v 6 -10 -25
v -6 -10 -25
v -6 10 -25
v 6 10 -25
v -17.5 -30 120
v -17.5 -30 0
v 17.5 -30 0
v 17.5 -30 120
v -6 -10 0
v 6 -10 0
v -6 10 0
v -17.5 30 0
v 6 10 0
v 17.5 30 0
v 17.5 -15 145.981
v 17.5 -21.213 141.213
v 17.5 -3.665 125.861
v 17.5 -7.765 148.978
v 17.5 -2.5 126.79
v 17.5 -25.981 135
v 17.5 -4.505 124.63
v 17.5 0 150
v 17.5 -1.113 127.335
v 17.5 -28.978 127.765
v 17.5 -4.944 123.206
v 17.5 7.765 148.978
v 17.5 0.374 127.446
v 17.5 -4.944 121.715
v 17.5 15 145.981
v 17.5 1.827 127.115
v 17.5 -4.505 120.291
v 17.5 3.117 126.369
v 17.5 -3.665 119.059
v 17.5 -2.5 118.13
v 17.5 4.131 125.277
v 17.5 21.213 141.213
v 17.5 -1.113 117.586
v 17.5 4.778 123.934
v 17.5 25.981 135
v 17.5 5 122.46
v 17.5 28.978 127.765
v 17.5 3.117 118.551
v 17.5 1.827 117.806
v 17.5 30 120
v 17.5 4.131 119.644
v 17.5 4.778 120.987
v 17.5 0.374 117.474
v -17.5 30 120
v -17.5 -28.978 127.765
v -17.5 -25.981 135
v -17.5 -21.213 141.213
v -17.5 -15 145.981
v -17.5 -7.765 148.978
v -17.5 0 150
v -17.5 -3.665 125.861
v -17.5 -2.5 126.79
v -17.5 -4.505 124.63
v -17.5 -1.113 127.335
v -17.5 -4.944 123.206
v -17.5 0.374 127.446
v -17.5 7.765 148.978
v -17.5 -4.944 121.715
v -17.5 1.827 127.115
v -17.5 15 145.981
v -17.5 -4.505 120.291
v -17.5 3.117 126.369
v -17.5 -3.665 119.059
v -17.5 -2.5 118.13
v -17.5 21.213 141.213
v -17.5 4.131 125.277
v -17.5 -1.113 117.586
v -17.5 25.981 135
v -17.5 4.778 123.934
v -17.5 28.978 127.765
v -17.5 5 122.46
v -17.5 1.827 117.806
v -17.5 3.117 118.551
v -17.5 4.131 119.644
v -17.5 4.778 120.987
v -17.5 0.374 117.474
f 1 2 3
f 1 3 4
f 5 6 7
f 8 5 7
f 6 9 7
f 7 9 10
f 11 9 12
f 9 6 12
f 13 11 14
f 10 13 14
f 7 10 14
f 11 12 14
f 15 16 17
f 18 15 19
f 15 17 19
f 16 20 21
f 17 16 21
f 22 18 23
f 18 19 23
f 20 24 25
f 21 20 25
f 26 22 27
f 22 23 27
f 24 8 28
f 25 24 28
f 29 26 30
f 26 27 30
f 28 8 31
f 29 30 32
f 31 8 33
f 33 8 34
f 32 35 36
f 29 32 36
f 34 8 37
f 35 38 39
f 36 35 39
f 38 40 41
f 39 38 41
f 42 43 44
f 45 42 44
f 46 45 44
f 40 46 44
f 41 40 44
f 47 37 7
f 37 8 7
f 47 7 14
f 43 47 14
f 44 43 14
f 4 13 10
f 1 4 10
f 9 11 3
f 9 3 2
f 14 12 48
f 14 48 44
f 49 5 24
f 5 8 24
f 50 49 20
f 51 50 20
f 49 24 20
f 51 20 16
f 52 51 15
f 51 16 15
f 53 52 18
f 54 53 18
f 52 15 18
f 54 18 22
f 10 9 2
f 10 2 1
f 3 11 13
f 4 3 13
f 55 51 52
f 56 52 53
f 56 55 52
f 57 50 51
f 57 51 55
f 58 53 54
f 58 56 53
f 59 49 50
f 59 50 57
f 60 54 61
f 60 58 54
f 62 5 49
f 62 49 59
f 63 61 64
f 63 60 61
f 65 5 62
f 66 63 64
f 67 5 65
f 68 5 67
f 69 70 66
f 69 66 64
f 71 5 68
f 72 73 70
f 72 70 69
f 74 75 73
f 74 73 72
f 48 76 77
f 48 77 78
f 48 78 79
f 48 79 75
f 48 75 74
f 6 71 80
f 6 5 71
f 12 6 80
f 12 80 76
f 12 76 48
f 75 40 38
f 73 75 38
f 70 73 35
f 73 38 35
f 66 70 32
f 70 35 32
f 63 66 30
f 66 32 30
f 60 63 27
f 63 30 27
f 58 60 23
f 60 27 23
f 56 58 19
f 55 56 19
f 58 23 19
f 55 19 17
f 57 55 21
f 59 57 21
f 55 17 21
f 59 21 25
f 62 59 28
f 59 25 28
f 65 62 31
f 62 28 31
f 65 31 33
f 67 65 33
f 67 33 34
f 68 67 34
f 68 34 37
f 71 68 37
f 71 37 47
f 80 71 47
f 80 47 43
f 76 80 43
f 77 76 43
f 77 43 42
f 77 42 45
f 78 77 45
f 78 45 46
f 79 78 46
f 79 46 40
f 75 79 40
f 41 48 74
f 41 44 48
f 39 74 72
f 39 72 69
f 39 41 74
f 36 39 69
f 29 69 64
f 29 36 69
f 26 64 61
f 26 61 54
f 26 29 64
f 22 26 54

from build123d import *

# Parameters (mm, degrees)
F0_W     = 35
F0_H     = 60
F1_DEPTH = 150
F2_W     = 12
F2_H     = 20
F3_DEPTH = 25
F4_R     = 29.99999
F6_D     = 10


# Not quite as in the source:
# - a fillet or chamfer is up to 0.001 mm smaller than in the source, because OpenCascade refuses the exact size


with BuildPart() as f1:
    # F0 (on Top) → F1 (new body)
    with BuildSketch(Plane.XY):
        Rectangle(F0_W, F0_H)
    extrude(amount=F1_DEPTH)

    # F2 (on face) → F3 (join)
    with BuildSketch(Plane(origin=(0, 0, 0), x_dir=(1, 0, 0), z_dir=(0, 0, -1))):
        Rectangle(F2_W, F2_H)
    extrude(amount=F3_DEPTH)

    # F4 (radius 30 in the source; OpenCascade refuses exactly that, so slightly less here)
    f4_edges = [f1.edges().sort_by_distance(p)[0] for p in [
        (0, -30, 150),
        (0, 30, 150),
    ]]
    fillet(f4_edges, radius=F4_R)

    # F6 (through all)
    with Locations(Plane(origin=(-17.5, 0, 0), x_dir=(0, -1, 0), z_dir=(-1, 0, 0))):
        with Locations((0, 122.46029087)):
            Hole(F6_D / 2)


solid = f1.part
